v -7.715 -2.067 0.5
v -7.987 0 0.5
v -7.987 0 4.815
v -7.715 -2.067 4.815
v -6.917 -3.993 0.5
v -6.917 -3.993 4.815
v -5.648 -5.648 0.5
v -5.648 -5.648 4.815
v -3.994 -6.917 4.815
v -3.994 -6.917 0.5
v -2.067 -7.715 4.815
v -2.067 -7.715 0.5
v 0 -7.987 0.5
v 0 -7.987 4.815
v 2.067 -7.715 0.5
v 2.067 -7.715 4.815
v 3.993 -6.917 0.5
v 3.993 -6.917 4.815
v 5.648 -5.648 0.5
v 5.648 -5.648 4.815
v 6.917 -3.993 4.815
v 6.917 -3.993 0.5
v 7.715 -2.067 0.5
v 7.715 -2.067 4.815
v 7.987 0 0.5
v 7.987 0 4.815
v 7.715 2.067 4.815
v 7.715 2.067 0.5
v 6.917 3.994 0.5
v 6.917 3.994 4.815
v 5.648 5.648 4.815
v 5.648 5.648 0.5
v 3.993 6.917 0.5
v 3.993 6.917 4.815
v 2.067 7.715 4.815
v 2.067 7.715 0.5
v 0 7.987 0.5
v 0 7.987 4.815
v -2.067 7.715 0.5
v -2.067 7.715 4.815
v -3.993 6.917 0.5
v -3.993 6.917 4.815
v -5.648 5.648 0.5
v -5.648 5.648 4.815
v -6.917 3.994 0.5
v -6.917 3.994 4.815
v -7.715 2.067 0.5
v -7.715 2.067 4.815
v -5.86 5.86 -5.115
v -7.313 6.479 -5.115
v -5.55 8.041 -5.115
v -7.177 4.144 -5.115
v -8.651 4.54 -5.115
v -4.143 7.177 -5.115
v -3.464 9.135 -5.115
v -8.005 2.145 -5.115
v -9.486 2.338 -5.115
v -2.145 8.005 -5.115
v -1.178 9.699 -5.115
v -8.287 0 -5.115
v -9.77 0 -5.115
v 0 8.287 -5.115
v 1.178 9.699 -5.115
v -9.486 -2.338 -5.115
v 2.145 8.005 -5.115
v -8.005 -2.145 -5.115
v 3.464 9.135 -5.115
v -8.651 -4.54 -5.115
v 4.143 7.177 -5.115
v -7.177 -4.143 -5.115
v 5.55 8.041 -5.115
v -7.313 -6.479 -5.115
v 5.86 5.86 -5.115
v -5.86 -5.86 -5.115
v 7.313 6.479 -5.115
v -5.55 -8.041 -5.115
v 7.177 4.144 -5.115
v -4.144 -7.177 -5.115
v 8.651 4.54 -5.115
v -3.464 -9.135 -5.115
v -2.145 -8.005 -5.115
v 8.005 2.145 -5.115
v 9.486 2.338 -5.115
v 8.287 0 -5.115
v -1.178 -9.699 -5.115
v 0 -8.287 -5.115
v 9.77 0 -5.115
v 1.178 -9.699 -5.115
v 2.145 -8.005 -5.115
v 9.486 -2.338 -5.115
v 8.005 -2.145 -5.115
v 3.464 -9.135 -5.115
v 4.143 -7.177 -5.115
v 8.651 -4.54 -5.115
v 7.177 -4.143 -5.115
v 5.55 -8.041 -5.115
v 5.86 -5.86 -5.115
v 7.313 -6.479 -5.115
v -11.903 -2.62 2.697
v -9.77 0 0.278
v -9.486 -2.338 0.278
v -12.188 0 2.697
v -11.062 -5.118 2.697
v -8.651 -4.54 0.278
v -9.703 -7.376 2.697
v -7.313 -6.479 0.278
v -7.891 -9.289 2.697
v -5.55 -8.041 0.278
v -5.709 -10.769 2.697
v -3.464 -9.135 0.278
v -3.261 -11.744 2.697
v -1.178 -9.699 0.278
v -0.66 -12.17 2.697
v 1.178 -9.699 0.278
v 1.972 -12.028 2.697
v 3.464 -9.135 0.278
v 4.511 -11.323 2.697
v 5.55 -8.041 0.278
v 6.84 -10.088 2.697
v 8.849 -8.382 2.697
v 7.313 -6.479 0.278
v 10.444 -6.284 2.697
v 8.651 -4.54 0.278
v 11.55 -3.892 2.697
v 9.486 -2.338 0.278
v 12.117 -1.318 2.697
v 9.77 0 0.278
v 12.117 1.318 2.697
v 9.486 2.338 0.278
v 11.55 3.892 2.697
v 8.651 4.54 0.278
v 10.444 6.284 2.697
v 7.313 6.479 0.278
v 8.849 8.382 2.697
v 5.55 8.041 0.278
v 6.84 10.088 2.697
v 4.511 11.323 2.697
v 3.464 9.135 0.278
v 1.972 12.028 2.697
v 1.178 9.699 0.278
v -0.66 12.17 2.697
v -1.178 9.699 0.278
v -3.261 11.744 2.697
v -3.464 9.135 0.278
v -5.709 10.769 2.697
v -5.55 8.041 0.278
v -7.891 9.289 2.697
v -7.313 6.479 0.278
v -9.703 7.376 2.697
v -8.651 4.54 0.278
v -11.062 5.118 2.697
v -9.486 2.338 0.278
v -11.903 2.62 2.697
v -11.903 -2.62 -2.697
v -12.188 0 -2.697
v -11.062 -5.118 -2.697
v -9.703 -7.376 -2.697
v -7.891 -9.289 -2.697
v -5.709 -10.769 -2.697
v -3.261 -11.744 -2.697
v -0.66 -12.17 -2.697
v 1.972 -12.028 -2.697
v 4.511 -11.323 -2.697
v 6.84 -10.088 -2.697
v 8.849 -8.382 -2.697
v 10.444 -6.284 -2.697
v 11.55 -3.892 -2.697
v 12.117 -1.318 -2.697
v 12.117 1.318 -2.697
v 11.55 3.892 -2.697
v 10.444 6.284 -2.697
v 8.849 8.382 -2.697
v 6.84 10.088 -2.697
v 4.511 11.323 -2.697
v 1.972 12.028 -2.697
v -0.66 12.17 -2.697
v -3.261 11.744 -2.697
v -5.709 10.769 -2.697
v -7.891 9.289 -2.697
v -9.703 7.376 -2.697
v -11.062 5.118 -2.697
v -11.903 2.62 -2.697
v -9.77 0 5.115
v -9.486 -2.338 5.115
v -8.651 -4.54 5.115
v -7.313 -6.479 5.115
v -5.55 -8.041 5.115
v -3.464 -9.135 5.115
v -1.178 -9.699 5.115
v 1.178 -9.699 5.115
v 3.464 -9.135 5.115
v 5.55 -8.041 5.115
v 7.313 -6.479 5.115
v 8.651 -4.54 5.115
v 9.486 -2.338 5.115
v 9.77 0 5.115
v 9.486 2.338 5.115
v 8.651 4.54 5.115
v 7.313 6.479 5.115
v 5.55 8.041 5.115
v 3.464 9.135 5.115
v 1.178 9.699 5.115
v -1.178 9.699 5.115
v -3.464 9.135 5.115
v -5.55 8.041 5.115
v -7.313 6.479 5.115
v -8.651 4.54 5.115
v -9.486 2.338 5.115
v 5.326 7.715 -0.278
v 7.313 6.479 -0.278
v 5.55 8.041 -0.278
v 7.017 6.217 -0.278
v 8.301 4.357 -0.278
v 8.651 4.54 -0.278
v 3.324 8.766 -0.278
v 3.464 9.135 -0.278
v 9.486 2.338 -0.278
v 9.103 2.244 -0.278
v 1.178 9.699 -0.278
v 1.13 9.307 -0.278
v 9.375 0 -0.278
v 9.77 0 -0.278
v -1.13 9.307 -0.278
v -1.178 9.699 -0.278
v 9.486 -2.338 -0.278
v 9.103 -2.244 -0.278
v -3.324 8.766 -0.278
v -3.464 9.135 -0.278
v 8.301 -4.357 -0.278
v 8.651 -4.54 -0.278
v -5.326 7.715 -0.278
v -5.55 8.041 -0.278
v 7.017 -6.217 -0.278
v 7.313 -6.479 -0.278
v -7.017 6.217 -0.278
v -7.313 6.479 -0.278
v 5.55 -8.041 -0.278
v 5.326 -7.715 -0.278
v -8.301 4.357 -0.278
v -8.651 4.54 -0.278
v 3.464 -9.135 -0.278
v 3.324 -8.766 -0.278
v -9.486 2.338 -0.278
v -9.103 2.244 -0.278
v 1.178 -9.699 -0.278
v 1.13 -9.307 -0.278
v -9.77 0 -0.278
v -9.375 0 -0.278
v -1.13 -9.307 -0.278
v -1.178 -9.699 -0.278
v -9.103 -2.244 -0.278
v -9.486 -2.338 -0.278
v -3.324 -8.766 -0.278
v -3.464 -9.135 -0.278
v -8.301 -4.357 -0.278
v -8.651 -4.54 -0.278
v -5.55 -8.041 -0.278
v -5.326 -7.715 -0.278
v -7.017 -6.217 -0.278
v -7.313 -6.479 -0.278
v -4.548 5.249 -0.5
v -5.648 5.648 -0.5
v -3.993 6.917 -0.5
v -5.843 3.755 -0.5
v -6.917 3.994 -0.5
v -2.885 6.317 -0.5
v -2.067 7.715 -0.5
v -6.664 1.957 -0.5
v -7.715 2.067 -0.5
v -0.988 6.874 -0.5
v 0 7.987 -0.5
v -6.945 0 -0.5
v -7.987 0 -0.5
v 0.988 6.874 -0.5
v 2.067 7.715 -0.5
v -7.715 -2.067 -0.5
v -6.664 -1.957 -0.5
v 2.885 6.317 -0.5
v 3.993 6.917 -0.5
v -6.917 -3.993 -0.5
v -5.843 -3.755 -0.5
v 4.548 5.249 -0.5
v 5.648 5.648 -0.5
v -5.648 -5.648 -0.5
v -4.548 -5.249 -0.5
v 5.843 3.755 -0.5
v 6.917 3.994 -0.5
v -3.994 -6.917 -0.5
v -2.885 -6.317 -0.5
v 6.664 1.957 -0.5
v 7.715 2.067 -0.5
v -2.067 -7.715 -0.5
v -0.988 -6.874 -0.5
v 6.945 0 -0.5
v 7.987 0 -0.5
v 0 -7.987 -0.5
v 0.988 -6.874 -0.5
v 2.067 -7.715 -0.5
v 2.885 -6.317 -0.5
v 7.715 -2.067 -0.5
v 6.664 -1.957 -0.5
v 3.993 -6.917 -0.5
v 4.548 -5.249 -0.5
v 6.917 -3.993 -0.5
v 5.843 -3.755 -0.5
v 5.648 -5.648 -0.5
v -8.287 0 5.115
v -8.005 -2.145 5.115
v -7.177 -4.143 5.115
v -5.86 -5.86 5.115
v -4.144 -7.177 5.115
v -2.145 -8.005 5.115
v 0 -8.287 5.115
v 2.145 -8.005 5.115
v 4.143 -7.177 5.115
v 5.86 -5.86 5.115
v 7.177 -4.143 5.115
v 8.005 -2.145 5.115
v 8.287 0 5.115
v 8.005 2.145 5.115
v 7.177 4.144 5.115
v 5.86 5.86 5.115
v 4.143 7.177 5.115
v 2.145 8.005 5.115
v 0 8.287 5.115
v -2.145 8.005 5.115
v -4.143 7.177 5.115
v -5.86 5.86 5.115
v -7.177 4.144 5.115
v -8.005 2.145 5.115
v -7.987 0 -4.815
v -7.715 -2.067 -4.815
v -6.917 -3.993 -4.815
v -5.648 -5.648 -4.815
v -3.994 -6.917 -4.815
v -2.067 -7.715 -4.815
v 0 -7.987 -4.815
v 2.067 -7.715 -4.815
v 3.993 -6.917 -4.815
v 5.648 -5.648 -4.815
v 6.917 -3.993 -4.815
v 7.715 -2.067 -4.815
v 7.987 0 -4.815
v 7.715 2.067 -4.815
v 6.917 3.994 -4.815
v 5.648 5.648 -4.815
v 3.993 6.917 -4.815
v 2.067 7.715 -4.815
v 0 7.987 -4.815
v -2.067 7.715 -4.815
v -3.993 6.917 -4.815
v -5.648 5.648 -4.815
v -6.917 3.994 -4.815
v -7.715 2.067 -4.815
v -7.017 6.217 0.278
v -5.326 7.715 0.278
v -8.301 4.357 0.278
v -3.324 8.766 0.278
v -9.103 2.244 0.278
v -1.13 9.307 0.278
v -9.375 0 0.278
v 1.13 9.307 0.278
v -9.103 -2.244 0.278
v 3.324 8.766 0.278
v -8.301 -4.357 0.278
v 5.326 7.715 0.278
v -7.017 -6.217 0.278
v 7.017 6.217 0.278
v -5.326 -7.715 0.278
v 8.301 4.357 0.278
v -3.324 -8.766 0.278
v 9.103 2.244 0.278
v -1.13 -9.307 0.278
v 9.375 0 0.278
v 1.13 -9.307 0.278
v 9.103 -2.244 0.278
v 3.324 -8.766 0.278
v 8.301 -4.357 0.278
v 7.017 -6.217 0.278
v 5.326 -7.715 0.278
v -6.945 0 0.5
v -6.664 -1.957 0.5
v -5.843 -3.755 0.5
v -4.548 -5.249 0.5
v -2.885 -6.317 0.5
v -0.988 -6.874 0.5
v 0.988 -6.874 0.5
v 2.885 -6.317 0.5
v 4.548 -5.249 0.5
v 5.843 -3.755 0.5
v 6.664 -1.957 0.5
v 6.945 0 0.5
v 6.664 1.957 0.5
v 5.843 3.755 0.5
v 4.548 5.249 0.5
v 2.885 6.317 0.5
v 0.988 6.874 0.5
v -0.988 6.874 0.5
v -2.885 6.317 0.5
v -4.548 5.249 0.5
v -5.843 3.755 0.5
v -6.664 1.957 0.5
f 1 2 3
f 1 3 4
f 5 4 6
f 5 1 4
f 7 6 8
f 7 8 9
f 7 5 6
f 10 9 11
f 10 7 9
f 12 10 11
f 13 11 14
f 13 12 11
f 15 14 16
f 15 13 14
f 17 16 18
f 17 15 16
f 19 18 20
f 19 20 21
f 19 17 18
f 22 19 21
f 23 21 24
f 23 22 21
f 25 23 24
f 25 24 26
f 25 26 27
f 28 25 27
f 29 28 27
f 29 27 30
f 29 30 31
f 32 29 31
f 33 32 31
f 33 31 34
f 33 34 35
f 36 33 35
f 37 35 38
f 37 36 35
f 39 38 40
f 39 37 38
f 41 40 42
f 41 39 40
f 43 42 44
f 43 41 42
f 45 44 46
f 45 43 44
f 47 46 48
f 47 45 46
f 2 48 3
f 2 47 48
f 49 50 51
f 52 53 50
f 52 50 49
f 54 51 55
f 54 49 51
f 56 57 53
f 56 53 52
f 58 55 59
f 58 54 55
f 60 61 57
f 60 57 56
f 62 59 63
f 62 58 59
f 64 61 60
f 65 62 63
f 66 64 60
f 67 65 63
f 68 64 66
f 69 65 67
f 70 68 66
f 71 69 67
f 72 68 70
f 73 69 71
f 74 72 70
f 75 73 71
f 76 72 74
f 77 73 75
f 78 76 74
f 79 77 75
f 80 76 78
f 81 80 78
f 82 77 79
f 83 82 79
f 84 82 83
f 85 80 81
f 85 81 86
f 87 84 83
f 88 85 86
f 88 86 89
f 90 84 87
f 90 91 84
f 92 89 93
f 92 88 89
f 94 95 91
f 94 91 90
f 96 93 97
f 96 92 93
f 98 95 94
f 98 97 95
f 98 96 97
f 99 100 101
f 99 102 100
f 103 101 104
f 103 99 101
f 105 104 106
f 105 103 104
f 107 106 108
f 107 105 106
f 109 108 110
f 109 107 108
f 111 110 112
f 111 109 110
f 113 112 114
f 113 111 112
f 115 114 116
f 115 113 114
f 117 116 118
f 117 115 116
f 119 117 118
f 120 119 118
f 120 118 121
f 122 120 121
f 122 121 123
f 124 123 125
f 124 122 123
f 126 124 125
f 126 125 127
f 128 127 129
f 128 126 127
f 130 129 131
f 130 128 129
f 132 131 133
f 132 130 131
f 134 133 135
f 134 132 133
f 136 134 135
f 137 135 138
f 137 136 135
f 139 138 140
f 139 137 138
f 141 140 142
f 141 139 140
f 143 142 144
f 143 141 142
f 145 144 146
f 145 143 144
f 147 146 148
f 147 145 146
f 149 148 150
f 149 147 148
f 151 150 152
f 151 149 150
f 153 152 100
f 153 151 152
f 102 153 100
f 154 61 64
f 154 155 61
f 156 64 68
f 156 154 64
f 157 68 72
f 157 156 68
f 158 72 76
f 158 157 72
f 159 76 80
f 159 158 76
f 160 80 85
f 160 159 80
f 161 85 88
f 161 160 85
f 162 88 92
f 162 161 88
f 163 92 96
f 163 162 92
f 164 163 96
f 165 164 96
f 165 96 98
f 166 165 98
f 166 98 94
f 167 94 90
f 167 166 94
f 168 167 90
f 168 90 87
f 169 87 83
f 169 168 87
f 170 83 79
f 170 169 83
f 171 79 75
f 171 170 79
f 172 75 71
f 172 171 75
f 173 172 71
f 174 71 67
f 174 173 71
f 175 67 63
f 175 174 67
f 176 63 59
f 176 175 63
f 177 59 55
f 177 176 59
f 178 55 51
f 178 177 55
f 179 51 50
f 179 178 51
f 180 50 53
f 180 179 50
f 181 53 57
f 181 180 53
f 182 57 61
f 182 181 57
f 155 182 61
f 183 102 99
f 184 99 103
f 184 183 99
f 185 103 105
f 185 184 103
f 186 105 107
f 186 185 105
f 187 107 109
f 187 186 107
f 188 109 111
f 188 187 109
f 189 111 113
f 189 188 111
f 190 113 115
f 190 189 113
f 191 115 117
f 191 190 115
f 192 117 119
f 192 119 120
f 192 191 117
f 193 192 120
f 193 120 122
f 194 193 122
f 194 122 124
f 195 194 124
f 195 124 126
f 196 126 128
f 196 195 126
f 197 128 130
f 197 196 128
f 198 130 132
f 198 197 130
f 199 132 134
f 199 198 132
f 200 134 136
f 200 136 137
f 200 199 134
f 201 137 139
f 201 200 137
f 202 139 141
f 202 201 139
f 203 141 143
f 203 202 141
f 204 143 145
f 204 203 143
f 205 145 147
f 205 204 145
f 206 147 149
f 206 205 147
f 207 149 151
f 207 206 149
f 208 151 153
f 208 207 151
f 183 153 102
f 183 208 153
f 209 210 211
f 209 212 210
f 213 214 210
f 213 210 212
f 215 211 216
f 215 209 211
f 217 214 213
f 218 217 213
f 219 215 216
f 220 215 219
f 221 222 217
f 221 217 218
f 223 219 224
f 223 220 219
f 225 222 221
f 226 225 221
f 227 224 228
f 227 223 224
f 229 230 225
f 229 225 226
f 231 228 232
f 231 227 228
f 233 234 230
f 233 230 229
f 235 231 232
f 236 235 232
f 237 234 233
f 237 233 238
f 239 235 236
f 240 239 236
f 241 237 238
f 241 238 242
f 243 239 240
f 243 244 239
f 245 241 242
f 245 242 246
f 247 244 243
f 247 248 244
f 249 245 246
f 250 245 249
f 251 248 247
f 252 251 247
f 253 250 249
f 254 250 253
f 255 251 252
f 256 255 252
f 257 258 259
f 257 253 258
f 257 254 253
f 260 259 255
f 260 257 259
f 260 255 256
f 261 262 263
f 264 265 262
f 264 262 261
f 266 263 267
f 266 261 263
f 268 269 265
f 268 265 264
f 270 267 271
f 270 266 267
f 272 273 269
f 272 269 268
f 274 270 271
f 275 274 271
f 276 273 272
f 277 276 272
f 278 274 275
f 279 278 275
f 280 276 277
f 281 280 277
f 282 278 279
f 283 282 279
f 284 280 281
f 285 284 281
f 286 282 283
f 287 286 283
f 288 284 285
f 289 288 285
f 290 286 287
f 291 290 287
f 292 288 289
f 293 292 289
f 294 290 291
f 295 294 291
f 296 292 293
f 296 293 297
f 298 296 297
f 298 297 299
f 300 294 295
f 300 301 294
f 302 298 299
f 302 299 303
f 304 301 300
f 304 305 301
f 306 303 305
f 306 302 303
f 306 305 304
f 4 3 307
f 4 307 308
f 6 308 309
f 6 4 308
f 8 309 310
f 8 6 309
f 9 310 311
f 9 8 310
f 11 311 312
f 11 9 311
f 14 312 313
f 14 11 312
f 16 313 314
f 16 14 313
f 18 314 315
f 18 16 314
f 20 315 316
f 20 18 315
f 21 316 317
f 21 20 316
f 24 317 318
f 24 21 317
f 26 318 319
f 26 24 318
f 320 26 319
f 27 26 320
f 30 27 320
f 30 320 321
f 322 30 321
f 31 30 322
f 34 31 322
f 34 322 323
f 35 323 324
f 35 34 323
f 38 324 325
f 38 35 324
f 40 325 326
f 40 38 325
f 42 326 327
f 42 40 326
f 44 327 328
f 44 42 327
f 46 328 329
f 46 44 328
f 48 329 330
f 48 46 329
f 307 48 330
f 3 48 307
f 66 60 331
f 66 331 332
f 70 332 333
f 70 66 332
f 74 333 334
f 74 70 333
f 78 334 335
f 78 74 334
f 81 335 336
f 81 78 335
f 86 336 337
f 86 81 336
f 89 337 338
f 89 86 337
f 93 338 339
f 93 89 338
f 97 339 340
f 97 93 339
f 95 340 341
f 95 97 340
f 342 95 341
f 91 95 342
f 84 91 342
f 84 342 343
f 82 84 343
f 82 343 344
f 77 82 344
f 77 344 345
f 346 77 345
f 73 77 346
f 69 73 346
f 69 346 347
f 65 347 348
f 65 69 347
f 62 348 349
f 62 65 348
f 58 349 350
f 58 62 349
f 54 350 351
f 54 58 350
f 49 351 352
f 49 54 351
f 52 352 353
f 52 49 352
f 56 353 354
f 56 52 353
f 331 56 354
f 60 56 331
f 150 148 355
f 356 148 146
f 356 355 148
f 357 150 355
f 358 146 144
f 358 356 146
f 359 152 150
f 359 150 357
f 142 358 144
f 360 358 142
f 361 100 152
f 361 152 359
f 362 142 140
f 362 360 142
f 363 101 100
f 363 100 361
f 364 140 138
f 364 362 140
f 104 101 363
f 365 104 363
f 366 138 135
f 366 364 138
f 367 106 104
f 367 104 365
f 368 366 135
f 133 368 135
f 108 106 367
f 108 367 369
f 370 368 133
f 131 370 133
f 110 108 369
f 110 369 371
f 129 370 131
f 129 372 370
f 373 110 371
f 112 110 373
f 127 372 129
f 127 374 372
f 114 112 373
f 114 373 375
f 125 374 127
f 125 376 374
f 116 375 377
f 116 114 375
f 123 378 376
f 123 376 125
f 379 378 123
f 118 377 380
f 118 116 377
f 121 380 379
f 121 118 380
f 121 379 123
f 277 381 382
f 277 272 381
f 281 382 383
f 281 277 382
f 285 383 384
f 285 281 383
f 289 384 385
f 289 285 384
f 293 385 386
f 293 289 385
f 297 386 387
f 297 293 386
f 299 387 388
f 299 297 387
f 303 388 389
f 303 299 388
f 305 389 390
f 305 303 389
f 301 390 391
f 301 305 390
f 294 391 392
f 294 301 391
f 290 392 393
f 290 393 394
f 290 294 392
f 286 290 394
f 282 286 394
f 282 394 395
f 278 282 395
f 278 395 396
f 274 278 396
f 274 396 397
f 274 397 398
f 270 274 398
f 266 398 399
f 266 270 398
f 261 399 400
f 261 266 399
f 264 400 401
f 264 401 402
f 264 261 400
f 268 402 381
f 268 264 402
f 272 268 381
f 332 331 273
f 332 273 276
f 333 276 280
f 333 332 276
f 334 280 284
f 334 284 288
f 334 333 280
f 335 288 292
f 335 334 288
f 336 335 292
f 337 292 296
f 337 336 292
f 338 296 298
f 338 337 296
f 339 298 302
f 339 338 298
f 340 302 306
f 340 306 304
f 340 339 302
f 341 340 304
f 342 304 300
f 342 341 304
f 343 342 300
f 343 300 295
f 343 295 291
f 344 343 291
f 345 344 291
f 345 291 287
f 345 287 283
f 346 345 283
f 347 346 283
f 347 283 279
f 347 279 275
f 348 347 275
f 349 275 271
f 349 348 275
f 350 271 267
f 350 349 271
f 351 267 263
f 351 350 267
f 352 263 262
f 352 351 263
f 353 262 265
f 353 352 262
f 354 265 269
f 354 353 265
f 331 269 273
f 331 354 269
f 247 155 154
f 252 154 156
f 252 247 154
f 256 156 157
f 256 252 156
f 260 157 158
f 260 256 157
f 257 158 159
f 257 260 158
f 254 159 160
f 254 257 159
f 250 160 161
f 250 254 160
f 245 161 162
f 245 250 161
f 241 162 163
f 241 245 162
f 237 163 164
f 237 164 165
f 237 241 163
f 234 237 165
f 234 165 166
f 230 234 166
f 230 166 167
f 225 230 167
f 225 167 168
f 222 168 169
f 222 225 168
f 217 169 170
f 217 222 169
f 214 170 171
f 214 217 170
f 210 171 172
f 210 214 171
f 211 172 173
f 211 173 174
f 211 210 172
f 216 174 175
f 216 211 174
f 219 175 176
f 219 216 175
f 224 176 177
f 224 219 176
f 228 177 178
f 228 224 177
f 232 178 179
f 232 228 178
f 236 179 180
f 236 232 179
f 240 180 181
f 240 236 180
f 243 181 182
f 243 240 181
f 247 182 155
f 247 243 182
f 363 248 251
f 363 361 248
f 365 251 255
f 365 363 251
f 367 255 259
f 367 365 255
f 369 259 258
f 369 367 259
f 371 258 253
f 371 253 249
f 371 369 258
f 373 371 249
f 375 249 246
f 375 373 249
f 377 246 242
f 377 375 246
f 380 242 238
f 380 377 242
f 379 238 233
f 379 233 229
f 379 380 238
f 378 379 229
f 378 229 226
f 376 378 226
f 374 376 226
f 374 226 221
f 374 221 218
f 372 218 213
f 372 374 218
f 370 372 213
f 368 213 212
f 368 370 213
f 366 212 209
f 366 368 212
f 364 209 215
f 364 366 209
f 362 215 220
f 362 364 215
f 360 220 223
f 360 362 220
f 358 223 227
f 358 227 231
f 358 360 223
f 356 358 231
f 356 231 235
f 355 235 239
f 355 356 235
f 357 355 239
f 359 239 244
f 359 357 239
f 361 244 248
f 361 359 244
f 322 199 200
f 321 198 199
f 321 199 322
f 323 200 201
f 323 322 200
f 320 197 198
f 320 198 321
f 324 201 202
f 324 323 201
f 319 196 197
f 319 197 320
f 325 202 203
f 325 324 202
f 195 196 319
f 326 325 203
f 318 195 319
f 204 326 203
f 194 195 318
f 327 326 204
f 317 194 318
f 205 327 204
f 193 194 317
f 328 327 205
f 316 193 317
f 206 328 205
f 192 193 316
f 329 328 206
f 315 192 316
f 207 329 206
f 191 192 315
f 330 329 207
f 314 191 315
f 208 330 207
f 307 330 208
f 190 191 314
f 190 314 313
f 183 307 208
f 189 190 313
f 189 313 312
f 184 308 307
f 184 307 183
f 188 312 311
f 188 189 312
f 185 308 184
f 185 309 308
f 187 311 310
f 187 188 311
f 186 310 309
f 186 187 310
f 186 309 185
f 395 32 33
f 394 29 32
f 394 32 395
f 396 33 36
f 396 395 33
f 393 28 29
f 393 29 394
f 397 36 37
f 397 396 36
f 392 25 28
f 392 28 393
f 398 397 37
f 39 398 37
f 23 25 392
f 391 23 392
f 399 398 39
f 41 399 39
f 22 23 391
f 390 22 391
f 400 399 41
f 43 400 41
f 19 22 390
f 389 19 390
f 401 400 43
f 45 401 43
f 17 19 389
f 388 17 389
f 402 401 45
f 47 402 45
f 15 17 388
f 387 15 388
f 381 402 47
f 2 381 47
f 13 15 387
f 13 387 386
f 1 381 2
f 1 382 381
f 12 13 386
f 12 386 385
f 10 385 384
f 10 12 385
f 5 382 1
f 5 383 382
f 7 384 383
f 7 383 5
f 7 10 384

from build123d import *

# Parameters (mm, degrees)
CHAMFER1_SIZE = 0.3


with BuildPart() as part:
    # Sketch1 → Revolve1 (revolve)
    with BuildSketch(Plane(origin=(0, 0, 0), x_dir=(1, 0, 0), z_dir=(0, 1, 0))):
        Polygon((-7.987, 0.5), (-7.987, 5.115), (-9.77, 5.115), (-12.188305192, 2.696694808), (-9.77, 0.278389617), (-9.375, 0.278389617), (-9.375, -0.278389617), (-9.77, -0.278389617), (-12.188305192, -2.696694808), (-9.77, -5.115), (-7.987, -5.115), (-7.987, -0.5), (-6.945, -0.5), (-6.945, 0.5), align=None)
    revolve(axis=Axis((0, 0, -5.115), (0, 0, 1)))

    # Chamfer1
    chamfer1_edges = [part.edges().sort_by_distance(p)[0] for p in [
        (7.987, 0, 5.115),
        (7.987, 0, -5.115),
    ]]
    chamfer(chamfer1_edges, length=CHAMFER1_SIZE)


solid = part.part
